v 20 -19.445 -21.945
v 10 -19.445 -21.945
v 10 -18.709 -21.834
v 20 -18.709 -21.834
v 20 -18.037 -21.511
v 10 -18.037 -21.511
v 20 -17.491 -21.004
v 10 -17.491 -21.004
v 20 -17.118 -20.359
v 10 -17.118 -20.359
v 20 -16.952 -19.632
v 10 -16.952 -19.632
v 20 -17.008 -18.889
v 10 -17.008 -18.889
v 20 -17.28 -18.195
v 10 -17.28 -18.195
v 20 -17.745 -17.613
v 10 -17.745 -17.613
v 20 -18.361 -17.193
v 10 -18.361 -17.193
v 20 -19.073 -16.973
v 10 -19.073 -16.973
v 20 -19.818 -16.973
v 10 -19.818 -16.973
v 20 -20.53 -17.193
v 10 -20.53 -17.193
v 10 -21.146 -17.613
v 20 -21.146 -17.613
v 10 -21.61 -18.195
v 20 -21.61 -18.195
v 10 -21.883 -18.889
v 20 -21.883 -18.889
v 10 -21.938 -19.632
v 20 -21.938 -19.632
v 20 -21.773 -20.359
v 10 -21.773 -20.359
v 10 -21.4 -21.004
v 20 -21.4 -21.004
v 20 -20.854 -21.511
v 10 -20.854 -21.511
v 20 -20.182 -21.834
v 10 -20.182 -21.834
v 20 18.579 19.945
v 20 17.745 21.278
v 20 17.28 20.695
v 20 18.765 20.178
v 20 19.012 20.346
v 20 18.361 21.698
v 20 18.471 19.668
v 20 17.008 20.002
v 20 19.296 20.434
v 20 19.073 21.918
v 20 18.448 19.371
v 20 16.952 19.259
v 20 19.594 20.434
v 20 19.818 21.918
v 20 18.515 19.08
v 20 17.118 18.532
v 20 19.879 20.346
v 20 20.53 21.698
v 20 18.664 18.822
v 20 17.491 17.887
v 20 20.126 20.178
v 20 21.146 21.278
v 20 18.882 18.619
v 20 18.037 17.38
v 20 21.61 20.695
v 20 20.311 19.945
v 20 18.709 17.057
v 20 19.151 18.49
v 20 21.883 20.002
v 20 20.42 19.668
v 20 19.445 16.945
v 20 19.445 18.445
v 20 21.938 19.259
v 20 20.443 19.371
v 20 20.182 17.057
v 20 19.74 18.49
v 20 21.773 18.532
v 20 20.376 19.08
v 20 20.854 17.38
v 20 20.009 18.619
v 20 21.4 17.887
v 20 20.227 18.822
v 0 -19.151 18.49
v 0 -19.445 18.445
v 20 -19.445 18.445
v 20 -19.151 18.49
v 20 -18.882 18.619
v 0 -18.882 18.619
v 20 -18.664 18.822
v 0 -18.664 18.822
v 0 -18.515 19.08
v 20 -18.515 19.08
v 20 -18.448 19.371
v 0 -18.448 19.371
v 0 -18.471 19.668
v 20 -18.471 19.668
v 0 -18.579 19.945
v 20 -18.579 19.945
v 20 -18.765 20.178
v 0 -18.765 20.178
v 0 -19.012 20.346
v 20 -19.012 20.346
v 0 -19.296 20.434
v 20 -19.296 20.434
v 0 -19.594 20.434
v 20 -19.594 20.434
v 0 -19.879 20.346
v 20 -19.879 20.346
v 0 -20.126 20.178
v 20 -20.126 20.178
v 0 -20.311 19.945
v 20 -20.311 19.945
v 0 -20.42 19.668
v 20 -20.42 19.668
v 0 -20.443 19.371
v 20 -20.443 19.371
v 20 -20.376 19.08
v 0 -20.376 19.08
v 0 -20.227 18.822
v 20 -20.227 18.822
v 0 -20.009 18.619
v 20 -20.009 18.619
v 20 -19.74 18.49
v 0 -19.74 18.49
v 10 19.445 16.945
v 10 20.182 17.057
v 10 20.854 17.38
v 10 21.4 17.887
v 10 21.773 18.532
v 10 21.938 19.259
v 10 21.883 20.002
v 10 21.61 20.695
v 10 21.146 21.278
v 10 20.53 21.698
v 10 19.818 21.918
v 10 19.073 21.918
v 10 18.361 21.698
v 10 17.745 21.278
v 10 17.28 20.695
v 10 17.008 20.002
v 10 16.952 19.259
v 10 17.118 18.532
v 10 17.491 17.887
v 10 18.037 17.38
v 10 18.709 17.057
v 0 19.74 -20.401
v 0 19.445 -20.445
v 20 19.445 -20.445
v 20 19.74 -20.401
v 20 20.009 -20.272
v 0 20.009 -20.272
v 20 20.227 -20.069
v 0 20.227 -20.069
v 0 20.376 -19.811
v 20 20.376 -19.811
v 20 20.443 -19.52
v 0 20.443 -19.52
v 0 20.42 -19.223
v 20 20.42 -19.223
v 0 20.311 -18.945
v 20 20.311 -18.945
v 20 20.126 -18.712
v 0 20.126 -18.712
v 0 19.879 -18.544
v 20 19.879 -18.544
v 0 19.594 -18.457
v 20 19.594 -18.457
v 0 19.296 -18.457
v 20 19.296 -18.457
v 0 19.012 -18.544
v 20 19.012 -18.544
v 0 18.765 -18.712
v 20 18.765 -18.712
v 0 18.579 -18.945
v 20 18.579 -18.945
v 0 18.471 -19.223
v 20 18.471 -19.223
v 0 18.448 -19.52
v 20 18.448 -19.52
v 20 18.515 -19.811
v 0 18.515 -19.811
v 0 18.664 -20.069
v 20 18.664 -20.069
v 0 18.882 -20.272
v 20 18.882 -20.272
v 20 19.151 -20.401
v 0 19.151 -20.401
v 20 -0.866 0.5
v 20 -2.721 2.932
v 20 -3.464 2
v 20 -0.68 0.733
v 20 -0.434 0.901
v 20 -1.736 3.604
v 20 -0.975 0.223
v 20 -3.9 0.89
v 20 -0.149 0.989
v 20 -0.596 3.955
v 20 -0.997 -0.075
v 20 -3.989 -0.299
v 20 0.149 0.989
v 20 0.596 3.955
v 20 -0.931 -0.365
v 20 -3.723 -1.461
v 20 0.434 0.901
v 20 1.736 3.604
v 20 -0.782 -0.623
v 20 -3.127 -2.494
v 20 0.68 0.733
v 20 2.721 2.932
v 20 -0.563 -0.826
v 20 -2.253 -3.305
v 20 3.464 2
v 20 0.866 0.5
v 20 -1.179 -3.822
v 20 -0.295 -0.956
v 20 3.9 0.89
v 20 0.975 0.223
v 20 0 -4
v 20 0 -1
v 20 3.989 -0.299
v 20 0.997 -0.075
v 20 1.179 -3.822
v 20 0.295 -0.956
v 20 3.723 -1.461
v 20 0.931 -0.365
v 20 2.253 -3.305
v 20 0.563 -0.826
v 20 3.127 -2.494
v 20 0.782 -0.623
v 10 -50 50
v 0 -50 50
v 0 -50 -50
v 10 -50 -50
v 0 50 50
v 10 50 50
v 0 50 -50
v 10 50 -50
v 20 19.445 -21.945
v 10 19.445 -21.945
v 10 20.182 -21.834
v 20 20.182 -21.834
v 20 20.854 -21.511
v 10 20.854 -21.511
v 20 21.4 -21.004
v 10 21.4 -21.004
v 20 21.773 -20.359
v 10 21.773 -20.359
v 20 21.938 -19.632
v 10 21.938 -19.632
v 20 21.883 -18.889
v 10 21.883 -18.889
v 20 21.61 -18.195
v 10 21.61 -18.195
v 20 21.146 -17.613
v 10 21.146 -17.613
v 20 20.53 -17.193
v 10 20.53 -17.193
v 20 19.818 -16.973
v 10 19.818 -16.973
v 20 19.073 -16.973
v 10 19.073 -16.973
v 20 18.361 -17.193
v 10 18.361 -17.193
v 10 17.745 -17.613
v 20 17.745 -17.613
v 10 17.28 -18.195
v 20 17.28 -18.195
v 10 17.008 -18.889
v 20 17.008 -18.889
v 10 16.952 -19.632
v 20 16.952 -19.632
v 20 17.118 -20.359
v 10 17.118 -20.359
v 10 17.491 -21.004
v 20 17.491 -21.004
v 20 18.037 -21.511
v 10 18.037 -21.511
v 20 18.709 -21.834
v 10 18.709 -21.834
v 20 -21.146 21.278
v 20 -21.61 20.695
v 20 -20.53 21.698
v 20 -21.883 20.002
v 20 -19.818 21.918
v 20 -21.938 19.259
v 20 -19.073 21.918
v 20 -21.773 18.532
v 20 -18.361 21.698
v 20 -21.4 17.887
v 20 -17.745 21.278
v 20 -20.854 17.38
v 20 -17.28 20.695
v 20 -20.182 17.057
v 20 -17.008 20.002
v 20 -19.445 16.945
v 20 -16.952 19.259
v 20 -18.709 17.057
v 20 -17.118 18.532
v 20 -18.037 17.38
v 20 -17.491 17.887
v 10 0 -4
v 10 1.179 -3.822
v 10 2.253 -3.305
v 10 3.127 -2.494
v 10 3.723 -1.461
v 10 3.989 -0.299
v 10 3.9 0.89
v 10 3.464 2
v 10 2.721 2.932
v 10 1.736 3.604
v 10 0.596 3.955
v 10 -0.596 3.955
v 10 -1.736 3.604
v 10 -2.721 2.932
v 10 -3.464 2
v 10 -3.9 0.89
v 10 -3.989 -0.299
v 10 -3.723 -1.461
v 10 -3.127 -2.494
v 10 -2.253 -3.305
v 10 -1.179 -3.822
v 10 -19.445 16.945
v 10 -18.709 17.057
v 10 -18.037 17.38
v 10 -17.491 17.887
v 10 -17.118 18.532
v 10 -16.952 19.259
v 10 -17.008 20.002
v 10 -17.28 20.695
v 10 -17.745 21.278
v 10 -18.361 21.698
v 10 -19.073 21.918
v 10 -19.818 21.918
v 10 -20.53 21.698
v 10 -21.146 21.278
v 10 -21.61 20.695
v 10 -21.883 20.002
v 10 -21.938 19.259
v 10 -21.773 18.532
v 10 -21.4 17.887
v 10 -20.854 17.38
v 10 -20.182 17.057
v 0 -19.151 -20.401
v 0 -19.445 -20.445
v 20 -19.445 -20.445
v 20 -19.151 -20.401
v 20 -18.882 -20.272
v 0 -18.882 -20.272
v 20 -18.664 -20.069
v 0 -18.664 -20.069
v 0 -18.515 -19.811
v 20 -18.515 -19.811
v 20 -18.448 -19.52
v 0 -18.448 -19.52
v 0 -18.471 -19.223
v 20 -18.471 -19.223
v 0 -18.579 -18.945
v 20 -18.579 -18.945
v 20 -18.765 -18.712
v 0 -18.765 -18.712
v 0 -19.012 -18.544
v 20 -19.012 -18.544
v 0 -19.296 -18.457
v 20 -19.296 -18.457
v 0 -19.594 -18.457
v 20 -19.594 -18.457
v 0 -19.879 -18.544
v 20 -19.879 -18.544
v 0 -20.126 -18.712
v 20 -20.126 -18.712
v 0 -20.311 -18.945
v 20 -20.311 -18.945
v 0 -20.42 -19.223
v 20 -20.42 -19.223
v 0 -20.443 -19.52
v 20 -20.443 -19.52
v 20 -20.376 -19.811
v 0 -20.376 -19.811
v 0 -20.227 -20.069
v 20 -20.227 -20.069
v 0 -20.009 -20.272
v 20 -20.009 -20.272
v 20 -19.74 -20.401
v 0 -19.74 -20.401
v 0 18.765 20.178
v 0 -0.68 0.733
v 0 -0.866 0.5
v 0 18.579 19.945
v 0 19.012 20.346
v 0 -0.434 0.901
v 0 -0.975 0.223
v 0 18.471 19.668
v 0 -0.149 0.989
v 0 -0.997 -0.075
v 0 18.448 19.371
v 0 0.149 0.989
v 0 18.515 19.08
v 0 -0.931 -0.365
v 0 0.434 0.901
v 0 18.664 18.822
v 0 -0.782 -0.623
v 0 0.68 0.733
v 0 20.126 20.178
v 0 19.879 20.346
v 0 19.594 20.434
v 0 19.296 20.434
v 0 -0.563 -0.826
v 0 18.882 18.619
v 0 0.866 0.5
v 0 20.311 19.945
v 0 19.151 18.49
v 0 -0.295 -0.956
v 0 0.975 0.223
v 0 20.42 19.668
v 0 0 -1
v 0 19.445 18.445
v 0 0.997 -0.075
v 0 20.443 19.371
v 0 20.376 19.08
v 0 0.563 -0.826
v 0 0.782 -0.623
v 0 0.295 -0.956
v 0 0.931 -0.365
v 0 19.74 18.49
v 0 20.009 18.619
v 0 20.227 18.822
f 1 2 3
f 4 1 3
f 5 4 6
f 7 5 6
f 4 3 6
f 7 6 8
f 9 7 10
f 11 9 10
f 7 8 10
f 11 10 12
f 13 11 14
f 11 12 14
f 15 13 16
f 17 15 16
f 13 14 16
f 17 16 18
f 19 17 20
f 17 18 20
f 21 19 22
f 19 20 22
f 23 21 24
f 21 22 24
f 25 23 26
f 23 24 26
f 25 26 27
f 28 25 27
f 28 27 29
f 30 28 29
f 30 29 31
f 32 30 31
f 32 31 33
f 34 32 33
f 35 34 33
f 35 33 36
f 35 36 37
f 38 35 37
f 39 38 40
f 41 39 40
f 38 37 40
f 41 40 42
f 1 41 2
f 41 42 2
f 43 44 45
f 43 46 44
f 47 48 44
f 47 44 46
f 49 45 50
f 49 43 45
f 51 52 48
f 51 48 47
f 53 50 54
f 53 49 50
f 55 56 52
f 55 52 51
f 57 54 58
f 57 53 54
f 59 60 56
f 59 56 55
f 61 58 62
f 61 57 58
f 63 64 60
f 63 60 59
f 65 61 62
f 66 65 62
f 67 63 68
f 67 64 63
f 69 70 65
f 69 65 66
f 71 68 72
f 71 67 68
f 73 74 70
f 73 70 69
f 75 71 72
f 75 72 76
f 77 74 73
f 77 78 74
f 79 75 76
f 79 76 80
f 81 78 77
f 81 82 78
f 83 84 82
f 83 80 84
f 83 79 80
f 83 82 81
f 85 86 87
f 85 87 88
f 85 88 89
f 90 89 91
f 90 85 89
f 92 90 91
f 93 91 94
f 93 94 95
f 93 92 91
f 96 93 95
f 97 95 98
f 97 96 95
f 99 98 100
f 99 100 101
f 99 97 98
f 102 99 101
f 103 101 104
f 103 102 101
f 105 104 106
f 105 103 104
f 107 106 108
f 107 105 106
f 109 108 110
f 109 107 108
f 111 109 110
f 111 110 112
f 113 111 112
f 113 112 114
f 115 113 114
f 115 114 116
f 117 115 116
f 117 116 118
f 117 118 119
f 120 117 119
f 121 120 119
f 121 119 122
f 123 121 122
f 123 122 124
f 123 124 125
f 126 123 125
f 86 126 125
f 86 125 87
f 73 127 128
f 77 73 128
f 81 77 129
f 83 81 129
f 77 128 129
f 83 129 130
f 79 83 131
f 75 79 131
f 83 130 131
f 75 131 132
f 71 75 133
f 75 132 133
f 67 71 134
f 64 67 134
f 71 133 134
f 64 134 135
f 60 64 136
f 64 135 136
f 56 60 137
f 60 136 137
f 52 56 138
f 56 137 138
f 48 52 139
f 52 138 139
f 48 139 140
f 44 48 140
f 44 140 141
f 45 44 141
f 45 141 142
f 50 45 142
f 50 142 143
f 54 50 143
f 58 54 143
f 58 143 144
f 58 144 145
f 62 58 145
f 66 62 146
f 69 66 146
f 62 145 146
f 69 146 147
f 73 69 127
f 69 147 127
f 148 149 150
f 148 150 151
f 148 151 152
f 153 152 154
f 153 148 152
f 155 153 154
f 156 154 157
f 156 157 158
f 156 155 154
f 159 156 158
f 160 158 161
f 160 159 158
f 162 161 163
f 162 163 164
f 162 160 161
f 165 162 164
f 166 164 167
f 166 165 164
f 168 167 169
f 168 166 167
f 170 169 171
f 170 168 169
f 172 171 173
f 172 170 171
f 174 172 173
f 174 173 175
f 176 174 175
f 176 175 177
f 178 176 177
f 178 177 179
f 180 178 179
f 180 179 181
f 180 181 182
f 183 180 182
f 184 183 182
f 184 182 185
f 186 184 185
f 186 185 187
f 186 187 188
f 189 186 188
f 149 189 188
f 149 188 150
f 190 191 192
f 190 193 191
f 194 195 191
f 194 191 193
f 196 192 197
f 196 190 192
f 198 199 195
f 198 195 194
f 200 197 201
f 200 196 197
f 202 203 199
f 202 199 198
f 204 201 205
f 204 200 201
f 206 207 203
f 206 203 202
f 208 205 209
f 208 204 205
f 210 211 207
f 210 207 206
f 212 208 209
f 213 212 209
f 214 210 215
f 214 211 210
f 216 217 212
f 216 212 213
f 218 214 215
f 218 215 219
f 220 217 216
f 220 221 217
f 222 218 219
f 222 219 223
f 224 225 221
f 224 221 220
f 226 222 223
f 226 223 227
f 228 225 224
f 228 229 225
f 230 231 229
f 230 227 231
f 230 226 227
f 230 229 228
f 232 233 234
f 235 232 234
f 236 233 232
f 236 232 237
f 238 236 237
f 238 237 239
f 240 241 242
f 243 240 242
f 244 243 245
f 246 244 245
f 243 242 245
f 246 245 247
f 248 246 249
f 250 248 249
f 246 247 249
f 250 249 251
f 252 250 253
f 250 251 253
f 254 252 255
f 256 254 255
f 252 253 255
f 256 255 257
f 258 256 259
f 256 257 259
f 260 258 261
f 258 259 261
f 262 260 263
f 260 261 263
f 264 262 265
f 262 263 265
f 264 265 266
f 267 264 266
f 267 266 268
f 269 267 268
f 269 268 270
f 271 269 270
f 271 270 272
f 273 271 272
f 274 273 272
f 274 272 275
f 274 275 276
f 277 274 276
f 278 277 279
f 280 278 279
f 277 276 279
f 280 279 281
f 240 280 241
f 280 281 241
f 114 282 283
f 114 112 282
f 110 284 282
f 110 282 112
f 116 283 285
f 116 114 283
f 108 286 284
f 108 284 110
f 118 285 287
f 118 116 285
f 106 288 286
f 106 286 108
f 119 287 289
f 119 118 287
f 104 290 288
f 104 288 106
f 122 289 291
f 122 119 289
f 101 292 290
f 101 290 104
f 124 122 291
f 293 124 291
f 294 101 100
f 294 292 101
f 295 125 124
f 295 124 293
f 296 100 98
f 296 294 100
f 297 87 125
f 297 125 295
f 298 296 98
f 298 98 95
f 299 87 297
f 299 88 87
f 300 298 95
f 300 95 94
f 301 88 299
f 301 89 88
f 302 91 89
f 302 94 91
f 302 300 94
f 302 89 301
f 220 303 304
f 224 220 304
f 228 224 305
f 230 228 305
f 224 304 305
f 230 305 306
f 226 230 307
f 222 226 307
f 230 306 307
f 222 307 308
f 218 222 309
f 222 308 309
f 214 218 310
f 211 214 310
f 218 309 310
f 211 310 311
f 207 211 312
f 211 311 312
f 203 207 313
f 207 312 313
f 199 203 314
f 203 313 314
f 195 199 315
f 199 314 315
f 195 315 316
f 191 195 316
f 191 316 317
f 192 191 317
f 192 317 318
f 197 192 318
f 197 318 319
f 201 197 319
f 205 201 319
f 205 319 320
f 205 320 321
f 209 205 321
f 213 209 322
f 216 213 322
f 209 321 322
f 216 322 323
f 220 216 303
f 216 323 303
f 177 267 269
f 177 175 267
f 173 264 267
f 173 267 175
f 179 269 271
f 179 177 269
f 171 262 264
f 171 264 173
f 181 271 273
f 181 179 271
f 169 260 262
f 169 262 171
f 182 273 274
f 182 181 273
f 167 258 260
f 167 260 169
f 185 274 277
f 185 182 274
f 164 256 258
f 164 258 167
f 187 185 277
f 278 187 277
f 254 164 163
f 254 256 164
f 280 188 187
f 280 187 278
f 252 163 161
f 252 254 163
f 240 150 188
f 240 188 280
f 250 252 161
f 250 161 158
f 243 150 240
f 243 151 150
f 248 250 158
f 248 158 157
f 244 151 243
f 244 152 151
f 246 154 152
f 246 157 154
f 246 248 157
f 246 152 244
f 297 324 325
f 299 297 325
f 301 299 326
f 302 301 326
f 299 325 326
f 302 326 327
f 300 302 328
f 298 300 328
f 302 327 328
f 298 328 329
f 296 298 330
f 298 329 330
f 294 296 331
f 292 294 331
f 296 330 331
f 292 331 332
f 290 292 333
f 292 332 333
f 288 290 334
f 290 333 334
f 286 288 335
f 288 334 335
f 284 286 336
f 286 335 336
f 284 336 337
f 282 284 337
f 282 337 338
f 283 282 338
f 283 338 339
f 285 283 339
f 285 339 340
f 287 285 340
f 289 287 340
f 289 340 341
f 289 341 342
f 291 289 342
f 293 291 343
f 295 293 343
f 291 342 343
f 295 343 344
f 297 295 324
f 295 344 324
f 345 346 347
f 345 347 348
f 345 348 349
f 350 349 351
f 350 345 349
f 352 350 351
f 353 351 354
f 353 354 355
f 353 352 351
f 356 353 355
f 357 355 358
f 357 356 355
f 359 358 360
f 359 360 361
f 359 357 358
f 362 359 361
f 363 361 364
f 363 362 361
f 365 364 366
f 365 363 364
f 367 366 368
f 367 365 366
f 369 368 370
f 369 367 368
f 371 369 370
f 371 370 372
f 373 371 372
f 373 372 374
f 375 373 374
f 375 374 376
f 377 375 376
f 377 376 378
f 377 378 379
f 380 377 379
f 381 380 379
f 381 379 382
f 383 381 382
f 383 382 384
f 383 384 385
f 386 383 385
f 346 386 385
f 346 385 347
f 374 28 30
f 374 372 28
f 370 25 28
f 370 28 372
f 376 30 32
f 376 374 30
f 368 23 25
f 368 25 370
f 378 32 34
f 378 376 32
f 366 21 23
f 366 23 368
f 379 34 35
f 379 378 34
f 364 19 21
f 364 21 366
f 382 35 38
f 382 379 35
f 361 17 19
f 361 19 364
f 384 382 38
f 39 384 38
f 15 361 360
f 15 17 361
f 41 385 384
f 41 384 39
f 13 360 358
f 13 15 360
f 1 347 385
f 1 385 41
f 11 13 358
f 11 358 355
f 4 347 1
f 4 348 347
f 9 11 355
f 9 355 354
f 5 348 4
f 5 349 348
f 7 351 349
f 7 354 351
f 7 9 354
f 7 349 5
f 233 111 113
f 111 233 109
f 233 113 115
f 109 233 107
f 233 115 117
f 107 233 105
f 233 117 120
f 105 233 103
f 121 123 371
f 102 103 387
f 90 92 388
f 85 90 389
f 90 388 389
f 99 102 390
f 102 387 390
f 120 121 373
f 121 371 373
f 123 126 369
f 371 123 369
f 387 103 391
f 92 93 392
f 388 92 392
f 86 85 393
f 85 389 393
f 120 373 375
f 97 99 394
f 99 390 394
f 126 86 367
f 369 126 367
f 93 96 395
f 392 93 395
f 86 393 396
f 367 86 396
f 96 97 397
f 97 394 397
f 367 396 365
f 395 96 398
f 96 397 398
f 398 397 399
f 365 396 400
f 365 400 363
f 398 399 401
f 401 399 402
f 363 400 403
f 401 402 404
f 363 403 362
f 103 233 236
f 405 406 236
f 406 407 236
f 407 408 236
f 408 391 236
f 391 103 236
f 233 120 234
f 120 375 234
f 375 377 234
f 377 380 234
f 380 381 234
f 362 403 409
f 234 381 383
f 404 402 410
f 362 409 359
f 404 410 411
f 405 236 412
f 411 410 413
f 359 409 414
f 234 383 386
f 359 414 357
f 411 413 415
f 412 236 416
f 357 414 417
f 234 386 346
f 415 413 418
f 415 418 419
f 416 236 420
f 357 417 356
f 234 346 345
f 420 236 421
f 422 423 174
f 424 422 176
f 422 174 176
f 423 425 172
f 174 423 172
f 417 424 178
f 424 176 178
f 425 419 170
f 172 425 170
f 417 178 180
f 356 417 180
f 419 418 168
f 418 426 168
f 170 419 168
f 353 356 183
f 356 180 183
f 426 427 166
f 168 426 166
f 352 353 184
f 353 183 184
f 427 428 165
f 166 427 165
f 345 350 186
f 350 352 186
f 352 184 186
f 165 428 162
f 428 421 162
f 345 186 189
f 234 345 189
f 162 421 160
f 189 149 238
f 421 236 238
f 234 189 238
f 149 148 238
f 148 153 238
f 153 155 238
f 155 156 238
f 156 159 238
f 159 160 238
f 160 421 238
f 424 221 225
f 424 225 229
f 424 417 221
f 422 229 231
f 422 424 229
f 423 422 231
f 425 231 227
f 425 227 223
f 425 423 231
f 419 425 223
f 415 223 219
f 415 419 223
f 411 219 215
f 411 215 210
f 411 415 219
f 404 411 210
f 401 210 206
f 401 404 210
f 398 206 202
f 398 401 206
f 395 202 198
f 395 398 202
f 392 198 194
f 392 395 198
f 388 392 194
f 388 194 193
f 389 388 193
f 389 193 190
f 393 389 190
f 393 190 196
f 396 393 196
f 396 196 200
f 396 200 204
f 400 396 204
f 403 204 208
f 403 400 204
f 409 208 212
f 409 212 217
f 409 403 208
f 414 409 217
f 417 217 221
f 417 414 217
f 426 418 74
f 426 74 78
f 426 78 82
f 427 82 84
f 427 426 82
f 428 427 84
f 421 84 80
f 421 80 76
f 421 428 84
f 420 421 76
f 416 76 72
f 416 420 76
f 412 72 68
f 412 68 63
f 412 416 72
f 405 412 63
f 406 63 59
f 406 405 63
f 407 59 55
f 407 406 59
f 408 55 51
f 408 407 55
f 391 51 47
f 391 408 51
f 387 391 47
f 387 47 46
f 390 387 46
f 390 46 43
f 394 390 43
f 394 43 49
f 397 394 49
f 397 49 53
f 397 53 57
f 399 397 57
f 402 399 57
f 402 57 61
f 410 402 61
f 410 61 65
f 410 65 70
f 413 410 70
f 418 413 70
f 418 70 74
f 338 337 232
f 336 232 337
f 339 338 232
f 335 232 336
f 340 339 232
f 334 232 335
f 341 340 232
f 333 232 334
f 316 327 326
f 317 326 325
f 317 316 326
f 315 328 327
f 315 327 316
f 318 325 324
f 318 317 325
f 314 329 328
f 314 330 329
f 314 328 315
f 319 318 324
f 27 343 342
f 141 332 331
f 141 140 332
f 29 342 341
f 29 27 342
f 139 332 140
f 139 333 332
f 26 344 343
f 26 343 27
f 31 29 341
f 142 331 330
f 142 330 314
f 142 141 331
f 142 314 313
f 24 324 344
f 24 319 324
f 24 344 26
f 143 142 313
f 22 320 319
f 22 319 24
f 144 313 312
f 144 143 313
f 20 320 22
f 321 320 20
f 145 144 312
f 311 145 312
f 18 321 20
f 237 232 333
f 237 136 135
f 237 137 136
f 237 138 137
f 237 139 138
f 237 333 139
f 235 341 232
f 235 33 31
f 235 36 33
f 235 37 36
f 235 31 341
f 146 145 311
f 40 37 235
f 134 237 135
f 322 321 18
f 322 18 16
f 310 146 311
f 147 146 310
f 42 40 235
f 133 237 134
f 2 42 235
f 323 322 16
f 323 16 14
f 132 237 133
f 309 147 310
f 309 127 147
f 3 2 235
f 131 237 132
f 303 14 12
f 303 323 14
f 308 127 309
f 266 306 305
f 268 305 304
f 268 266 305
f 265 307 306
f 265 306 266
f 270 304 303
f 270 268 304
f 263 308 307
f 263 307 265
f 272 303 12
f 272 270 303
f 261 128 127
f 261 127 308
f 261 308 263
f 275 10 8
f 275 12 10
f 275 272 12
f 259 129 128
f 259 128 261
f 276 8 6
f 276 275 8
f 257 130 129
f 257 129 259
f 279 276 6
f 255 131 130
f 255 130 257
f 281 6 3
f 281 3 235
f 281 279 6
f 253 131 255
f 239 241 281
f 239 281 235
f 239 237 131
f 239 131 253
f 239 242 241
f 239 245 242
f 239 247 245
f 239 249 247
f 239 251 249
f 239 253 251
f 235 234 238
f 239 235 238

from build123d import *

# Parameters (mm, degrees)
SKETCH1_W           = 100
SKETCH1_H           = 100
SKETCH1_R           = 1
BOSS_EXTRUDE2_DEPTH = 10
SKETCH2_R           = 4
SKETCH2_R_2         = 1
SKETCH2_R_3         = 2.5
BOSS_EXTRUDE3_DEPTH = 10


with BuildPart() as part:
    # Sketch1 → Boss-Extrude2 (new body)
    with BuildSketch(Plane(origin=(0, 0, 0), x_dir=(0, 0, -1), z_dir=(1, 0, 0))):
        Rectangle(SKETCH1_W, SKETCH1_H)
        with Locations((19.445436483, 19.445436483)):
            Circle(SKETCH1_R, mode=Mode.SUBTRACT)
        with Locations((19.445436483, -19.445436483)):
            Circle(SKETCH1_R, mode=Mode.SUBTRACT)
        with Locations((-19.445436483, -19.445436483)):
            Circle(SKETCH1_R, mode=Mode.SUBTRACT)
        with Locations((-19.445436483, 19.445436483)):
            Circle(SKETCH1_R, mode=Mode.SUBTRACT)
        Circle(SKETCH1_R, mode=Mode.SUBTRACT)
    extrude(amount=BOSS_EXTRUDE2_DEPTH)

    # Sketch2 → Boss-Extrude3 (add)
    # profile 1 of 5: a face of its own
    with BuildSketch(Plane(origin=(10, 0, 0), x_dir=(0, 0, -1), z_dir=(1, 0, 0))):
        Circle(SKETCH2_R)
        Circle(SKETCH2_R_2, mode=Mode.SUBTRACT)
    # profile 2 of 5: a face of its own
    with BuildSketch(Plane(origin=(10, 0, 0), x_dir=(0, 0, -1), z_dir=(1, 0, 0))):
        with Locations((19.445436483, 19.445436483)):
            Circle(SKETCH2_R_3)
        with Locations((19.445436483, 19.445436483)):
            Circle(SKETCH2_R_2, mode=Mode.SUBTRACT)
    # profile 3 of 5: a face of its own
    with BuildSketch(Plane(origin=(10, 0, 0), x_dir=(0, 0, -1), z_dir=(1, 0, 0))):
        with Locations((19.445436483, -19.445436483)):
            Circle(SKETCH2_R_3)
        with Locations((19.445436483, -19.445436483)):
            Circle(SKETCH2_R_2, mode=Mode.SUBTRACT)
    # profile 4 of 5: a face of its own
    with BuildSketch(Plane(origin=(10, 0, 0), x_dir=(0, 0, -1), z_dir=(1, 0, 0))):
        with Locations((-19.445436483, -19.445436483)):
            Circle(SKETCH2_R_3)
        with Locations((-19.445436483, -19.445436483)):
            Circle(SKETCH2_R_2, mode=Mode.SUBTRACT)
    # profile 5 of 5: a face of its own
    with BuildSketch(Plane(origin=(10, 0, 0), x_dir=(0, 0, -1), z_dir=(1, 0, 0))):
        with Locations((-19.445436483, 19.445436483)):
            Circle(SKETCH2_R_3)
        with Locations((-19.445436483, 19.445436483)):
            Circle(SKETCH2_R_2, mode=Mode.SUBTRACT)
    extrude(amount=BOSS_EXTRUDE3_DEPTH)


solid = part.part
